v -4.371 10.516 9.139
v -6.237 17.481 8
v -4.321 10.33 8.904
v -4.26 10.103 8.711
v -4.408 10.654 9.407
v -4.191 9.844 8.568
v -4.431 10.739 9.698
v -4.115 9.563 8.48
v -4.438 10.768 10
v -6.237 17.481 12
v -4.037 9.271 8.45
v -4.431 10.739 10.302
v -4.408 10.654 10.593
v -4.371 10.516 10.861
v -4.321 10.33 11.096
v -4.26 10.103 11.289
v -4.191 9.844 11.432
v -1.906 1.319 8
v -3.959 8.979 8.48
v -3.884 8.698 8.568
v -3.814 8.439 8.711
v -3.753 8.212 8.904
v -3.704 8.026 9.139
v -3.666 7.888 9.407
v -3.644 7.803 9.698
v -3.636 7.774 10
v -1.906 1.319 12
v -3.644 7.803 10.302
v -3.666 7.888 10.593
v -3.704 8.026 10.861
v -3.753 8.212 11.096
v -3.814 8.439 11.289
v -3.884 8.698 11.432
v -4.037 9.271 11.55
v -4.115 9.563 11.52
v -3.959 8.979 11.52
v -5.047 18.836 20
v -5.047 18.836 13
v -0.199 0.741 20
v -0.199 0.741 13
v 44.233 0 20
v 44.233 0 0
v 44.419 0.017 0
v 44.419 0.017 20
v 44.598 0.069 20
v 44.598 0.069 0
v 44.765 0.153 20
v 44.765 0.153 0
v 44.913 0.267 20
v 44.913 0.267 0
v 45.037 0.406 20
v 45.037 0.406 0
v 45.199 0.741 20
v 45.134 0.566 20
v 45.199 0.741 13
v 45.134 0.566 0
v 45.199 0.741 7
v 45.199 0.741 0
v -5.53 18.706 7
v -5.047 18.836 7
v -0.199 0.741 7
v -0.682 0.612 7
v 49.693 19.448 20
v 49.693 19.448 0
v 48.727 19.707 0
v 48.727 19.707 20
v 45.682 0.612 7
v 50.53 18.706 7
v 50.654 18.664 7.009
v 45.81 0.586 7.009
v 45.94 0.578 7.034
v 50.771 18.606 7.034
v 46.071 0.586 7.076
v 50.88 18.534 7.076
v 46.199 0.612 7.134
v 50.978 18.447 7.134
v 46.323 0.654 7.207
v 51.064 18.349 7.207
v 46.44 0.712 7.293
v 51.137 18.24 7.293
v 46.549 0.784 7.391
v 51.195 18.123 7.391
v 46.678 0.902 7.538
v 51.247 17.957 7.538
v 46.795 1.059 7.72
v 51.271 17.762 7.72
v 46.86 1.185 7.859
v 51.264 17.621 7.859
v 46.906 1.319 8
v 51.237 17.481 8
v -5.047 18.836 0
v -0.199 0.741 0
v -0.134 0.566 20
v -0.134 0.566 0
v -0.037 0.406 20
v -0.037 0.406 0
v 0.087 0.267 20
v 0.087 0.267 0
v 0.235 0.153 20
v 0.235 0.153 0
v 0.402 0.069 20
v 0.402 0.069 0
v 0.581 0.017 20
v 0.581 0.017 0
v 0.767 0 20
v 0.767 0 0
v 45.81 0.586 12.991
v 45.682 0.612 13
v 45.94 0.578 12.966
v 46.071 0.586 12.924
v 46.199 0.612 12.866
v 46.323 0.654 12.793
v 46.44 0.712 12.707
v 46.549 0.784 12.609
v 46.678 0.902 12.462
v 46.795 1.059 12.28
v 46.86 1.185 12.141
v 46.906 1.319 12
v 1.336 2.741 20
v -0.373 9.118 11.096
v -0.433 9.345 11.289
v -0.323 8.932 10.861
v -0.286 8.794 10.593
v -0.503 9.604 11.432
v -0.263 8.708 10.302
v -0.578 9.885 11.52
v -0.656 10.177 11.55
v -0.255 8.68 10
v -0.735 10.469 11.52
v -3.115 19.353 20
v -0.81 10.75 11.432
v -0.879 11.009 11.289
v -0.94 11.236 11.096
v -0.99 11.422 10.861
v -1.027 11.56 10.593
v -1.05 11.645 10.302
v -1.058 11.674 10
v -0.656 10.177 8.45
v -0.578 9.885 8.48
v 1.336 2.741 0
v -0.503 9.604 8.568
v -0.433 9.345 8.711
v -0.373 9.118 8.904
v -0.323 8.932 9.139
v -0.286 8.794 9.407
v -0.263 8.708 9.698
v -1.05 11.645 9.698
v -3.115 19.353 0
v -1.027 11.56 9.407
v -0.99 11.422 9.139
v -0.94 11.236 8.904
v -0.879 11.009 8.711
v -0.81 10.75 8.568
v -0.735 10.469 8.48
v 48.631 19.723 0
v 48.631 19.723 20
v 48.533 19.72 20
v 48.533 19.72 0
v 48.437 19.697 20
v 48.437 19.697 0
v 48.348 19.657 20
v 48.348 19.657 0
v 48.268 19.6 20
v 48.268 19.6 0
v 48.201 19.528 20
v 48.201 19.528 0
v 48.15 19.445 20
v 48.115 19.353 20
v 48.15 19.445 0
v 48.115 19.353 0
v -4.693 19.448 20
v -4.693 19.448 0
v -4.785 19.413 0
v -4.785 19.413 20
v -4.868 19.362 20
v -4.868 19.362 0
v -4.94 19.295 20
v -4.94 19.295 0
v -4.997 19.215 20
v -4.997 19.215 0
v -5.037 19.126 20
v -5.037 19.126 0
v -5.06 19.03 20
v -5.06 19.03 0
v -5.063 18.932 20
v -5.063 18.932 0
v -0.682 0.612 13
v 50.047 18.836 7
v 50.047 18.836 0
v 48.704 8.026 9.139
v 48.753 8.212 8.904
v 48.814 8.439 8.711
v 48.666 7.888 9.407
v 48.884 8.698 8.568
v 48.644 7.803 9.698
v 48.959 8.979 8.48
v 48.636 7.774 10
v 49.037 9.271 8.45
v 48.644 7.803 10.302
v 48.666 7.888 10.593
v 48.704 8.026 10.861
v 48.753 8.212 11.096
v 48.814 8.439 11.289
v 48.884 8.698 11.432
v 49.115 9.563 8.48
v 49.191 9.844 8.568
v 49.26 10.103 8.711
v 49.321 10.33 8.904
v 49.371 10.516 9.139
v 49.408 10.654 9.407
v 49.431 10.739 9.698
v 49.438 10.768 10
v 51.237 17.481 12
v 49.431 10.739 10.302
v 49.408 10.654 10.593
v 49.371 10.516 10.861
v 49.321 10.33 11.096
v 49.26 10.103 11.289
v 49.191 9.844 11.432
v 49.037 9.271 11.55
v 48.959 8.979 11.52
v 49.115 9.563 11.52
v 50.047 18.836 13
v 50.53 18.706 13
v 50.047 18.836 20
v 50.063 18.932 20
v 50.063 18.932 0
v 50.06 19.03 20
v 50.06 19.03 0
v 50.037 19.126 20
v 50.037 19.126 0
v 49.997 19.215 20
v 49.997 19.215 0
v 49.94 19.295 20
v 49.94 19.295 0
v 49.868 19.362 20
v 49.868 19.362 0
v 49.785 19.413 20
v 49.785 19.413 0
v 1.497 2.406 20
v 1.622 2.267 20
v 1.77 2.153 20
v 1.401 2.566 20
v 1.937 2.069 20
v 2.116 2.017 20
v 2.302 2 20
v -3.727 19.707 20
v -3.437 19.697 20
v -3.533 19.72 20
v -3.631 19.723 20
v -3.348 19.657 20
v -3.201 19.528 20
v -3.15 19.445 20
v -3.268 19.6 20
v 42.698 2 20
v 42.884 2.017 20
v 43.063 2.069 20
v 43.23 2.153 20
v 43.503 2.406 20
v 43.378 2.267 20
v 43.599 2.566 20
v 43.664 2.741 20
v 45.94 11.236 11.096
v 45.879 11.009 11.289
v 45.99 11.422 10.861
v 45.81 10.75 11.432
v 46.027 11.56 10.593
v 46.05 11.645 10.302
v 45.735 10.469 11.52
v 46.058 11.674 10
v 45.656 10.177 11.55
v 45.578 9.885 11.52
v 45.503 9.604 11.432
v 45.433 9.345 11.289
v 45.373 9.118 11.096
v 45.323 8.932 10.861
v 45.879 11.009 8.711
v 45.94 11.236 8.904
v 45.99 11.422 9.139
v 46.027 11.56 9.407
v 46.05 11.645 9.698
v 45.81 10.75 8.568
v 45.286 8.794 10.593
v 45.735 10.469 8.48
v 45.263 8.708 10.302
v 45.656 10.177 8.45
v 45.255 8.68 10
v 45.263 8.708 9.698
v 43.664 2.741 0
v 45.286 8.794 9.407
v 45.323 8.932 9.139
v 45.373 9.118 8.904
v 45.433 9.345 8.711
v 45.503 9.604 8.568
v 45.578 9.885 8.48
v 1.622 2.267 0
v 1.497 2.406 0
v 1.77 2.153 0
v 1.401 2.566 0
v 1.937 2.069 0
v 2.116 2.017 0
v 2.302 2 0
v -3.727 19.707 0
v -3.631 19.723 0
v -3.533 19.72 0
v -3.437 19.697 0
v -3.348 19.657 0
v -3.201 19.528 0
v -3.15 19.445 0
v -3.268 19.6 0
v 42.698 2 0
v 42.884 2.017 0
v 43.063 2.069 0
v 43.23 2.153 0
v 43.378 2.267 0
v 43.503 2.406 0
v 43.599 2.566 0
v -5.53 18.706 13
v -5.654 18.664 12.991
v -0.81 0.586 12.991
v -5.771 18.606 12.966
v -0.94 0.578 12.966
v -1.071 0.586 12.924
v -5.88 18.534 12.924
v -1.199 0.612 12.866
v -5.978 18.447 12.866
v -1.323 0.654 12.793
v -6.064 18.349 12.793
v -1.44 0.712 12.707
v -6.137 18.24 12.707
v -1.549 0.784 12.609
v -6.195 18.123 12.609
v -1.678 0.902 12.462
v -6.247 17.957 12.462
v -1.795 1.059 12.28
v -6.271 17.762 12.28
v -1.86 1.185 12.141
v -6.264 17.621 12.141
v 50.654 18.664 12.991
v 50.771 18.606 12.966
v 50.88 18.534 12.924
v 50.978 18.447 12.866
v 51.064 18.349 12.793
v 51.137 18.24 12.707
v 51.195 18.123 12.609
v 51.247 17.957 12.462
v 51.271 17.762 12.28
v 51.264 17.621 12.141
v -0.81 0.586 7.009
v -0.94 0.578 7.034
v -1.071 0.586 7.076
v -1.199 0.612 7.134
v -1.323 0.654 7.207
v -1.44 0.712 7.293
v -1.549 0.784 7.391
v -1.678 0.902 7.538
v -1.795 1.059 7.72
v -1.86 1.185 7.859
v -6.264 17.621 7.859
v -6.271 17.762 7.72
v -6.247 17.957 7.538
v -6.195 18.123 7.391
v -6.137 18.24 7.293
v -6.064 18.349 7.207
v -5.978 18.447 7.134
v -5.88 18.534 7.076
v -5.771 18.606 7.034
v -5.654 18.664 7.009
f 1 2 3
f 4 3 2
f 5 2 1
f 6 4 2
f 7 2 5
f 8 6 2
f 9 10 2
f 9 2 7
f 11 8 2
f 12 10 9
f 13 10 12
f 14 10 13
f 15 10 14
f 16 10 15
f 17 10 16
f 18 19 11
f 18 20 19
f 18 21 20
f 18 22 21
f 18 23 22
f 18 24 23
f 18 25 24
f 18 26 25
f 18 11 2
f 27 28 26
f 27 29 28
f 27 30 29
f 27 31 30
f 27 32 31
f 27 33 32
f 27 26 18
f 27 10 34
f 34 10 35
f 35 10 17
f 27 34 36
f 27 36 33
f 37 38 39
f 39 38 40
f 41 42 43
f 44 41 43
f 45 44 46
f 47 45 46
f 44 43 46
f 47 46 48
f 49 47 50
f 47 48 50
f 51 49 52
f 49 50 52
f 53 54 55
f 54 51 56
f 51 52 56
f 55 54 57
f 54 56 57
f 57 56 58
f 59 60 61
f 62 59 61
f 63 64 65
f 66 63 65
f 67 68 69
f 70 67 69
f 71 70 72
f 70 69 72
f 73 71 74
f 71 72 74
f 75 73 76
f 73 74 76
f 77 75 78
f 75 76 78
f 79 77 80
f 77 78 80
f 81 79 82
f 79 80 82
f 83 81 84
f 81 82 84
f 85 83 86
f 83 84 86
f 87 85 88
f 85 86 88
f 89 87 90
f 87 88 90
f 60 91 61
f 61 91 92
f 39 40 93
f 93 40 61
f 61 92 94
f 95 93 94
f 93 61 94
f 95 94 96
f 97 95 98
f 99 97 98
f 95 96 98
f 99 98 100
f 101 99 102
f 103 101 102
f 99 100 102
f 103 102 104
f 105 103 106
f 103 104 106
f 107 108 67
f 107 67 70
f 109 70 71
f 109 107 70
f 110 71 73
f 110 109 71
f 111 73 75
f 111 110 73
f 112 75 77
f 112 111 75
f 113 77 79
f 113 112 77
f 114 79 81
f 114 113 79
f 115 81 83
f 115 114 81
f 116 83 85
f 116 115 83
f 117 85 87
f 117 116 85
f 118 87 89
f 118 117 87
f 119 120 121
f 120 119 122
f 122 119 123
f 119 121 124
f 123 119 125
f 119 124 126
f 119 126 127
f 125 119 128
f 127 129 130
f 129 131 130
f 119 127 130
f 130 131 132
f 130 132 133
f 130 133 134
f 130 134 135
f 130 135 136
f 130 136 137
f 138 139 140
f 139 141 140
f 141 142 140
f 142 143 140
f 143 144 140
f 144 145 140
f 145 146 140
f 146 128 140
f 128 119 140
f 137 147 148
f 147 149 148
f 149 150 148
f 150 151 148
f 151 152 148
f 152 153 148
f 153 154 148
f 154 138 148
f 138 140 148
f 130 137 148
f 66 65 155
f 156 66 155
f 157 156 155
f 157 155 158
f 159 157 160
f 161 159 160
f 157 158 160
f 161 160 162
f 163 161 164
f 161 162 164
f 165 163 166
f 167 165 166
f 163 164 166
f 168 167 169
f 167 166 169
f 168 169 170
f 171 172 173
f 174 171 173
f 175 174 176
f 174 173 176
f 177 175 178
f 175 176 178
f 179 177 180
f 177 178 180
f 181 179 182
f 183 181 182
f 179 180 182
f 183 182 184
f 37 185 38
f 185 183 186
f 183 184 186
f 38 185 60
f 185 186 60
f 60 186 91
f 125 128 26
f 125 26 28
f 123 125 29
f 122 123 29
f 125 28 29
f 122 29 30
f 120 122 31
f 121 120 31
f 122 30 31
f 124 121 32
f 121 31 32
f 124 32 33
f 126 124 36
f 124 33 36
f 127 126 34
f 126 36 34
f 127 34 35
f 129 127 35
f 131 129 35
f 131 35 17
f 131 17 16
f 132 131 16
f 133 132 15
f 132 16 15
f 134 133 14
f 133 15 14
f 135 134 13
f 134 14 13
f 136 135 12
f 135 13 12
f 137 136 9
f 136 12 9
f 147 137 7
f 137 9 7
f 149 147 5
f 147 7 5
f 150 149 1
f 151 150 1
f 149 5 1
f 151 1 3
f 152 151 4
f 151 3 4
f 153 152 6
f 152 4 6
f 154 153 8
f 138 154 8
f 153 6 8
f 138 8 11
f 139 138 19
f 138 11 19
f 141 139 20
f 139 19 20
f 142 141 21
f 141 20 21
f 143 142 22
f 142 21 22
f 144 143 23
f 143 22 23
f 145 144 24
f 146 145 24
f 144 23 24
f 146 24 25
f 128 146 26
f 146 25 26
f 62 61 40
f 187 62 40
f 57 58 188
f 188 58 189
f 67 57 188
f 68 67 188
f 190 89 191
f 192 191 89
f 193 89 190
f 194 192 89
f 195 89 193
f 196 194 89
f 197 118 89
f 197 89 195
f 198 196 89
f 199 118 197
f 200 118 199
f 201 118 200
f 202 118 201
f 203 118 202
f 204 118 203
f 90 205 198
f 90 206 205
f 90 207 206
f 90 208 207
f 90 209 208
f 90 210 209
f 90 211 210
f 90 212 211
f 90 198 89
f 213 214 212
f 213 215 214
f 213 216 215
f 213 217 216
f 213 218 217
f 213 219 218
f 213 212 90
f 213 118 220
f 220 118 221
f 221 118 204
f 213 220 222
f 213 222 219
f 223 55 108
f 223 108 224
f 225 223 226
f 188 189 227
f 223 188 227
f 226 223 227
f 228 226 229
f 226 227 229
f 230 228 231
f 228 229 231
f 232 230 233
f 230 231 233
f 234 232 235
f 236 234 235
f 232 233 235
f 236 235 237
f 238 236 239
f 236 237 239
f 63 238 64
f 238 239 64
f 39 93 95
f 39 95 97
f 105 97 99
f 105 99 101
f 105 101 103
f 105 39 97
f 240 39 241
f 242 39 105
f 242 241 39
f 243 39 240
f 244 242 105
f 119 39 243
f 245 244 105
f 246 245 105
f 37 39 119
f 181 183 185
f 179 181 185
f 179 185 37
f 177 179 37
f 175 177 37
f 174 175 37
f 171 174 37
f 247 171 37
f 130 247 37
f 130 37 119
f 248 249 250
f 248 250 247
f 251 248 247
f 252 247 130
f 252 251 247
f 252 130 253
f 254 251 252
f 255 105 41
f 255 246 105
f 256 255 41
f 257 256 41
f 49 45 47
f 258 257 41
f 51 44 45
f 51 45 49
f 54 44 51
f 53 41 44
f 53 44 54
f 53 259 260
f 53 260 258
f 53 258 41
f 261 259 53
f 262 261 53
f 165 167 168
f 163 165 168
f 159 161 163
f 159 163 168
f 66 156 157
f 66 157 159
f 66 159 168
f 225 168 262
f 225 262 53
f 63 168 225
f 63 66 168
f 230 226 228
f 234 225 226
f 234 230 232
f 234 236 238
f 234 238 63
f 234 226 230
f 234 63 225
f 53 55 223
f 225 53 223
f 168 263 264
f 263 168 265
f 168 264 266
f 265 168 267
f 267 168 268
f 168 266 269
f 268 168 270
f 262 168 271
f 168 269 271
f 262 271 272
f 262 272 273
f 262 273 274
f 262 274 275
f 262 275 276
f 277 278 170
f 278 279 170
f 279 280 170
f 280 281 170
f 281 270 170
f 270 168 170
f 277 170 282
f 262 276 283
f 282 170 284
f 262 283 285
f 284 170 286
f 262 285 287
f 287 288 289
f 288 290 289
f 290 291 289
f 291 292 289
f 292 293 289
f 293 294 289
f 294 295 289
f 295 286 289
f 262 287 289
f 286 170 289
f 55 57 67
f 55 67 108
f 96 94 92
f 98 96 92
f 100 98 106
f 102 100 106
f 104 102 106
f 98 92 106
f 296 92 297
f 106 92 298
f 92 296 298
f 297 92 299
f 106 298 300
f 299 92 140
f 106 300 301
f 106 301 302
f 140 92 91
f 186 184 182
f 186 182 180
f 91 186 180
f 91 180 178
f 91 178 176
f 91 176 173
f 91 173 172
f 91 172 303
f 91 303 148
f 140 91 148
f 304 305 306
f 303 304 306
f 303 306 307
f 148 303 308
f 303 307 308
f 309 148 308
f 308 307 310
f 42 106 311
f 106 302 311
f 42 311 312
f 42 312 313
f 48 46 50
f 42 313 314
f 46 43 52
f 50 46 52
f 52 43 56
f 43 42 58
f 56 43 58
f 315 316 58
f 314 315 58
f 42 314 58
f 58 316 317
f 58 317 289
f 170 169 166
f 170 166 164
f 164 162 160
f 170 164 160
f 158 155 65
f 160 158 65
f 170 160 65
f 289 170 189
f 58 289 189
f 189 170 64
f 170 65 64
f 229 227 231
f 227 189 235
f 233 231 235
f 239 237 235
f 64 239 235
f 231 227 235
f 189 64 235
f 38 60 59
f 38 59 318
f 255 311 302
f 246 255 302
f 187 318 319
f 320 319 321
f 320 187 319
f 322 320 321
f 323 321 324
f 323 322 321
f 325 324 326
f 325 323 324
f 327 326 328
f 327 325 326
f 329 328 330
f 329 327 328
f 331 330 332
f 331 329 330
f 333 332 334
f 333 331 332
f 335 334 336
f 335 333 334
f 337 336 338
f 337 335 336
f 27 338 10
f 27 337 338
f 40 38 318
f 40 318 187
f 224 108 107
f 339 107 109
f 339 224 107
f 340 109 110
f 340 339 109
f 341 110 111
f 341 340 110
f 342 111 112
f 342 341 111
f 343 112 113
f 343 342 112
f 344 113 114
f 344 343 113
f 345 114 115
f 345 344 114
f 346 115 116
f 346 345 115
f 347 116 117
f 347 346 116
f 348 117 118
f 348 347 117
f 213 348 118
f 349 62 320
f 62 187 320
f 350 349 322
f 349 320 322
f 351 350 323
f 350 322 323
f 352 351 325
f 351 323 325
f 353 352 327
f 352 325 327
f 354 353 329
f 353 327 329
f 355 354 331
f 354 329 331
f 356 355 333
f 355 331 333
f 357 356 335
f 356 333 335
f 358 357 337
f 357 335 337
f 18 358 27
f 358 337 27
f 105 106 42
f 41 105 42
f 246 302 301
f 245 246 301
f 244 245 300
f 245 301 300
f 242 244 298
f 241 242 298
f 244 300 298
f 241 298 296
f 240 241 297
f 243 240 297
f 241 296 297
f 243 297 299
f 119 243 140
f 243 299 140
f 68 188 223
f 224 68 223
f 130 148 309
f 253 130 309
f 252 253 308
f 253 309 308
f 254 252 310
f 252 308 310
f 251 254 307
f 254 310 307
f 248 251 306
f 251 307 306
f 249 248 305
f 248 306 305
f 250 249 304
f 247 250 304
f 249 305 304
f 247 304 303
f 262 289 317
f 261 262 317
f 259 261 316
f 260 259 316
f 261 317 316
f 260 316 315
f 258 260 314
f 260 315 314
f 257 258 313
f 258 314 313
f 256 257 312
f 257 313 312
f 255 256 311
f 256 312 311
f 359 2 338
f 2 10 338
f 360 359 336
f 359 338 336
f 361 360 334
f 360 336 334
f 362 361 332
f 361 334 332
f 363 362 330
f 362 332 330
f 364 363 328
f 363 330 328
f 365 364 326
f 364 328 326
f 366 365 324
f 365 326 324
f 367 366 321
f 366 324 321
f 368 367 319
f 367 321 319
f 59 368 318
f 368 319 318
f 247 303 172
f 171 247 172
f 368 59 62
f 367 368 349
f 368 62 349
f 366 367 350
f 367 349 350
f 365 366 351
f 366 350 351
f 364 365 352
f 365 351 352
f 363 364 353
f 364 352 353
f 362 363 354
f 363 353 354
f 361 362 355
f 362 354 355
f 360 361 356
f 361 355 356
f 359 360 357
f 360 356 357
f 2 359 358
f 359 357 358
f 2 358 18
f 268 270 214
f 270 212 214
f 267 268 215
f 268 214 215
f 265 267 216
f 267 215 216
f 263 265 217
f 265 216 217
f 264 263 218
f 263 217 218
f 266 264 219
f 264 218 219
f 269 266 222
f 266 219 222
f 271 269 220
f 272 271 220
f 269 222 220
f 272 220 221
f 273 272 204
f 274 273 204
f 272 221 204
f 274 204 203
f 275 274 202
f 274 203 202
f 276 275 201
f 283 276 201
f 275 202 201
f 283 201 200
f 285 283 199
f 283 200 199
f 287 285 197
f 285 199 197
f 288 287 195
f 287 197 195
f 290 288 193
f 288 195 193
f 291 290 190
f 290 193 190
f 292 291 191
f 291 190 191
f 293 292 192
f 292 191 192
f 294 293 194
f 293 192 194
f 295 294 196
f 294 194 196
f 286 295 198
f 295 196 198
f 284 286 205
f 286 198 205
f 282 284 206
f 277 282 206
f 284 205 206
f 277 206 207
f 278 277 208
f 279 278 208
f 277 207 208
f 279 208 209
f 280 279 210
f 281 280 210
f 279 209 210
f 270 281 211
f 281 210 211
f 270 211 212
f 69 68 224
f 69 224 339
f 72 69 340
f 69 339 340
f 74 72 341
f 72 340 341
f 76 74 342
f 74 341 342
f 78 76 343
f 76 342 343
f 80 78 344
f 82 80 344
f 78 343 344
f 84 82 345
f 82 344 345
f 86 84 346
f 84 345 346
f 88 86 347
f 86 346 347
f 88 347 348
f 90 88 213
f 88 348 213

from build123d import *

# Parameters (mm, degrees)
F1_DEPTH = 20
F2_W     = 18.732673012
F2_H     = 6
F3_DEPTH = 1.5
F4_W     = 18.732673012
F4_H     = 6
F5_DEPTH = 1.5
F6_R     = 1.55
F7_DEPTH = 12.5
F8_R     = 1.55
F9_DEPTH = 12.5
F10_R    = 1


with BuildPart() as f1:
    # F0 (on Top) → F1 (new body)
    with BuildSketch(Plane.XY):
        with BuildLine():
            ThreePointArc((-0.1985988383, 0.7411809549), (0.158565559, 0.2066466597), (0.767326988, 0))
            Line((0.767326988, 0), (44.232673012, 0))
            ThreePointArc((44.232673012, 0), (44.841434441, 0.2066466597), (45.1985988383, 0.7411809549))
            Line((45.1985988383, 0.7411809549), (50.0469713795, 18.8355536126))
            ThreePointArc((50.0469713795, 18.8355536126), (49.9970211682, 19.2149631352), (49.6934179889, 19.4479260483))
            Line((49.6934179889, 19.4479260483), (48.7274921626, 19.7067450934))
            ThreePointArc((48.7274921626, 19.7067450934), (48.3480826401, 19.6567948822), (48.1151197269, 19.3531917028))
            Line((48.1151197269, 19.3531917028), (43.6639448624, 2.7411809549))
            ThreePointArc((43.6639448624, 2.7411809549), (43.3067804651, 2.2066466597), (42.6980190361, 2))
            Line((42.6980190361, 2), (2.3019809639, 2))
            ThreePointArc((2.3019809639, 2), (1.6932195349, 2.2066466597), (1.3360551376, 2.7411809549))
            Line((1.3360551376, 2.7411809549), (-3.1151197269, 19.3531917028))
            ThreePointArc((-3.1151197269, 19.3531917028), (-3.3480826401, 19.6567948822), (-3.7274921626, 19.7067450934))
            Line((-3.7274921626, 19.7067450934), (-4.6934179889, 19.4479260483))
            ThreePointArc((-4.6934179889, 19.4479260483), (-4.9970211682, 19.2149631352), (-5.0469713795, 18.8355536126))
            Line((-5.0469713795, 18.8355536126), (-0.1985988383, 0.7411809549))
        make_face()
    extrude(amount=F1_DEPTH)

    # F2 (on face) → F3 (join)
    with BuildSketch(Plane(origin=(41.9855715851, -11.25, 0), x_dir=(0.2588190451, 0.9659258263, 0), z_dir=(0.9659258263, -0.2588190451, 0))):
        with Locations((21.7805205236, 10)):
            Rectangle(F2_W, F2_H)
    extrude(amount=F3_DEPTH)

    # F4 (on face) → F5 (join)
    with BuildSketch(Plane(origin=(0, 0, 0), x_dir=(0.2588190451, -0.9659258263, 0), z_dir=(-0.9659258263, -0.2588190451, 0))):
        with Locations((-10.133663494, 10)):
            Rectangle(F4_W, F4_H)
    extrude(amount=F5_DEPTH)

    # F6 (on face) → F7 (cut, symmetric)
    with BuildSketch(Plane(origin=(0, 0, 0), x_dir=(0.2588190451, -0.9659258263, 0), z_dir=(-0.9659258263, -0.2588190451, 0))):
        with Locations((-10, 10)):
            Circle(F6_R)
    extrude(amount=F7_DEPTH, both=True, mode=Mode.SUBTRACT)

    # F8 (on face) → F9 (cut, symmetric)
    with BuildSketch(Plane(origin=(41.9855715851, -11.25, 0), x_dir=(0.2588190451, 0.9659258263, 0), z_dir=(0.9659258263, -0.2588190451, 0))):
        with Locations((21.6468570296, 10)):
            Circle(F8_R)
    extrude(amount=F9_DEPTH, both=True, mode=Mode.SUBTRACT)

    # F10
    f10_edges = [f1.edges().sort_by_distance(p)[0] for p in [
        (-1.647488, 0.352952, 10),
        (-4.071674, 9.400139, 7),
        (-4.071674, 9.400139, 13),
        (-6.49586, 18.447325, 10),
        (51.49586, 18.447325, 10),
        (49.071674, 9.400139, 7),
        (49.071674, 9.400139, 13),
        (46.647488, 0.352952, 10),
    ]]
    fillet(f10_edges, radius=F10_R)


solid = f1.part
